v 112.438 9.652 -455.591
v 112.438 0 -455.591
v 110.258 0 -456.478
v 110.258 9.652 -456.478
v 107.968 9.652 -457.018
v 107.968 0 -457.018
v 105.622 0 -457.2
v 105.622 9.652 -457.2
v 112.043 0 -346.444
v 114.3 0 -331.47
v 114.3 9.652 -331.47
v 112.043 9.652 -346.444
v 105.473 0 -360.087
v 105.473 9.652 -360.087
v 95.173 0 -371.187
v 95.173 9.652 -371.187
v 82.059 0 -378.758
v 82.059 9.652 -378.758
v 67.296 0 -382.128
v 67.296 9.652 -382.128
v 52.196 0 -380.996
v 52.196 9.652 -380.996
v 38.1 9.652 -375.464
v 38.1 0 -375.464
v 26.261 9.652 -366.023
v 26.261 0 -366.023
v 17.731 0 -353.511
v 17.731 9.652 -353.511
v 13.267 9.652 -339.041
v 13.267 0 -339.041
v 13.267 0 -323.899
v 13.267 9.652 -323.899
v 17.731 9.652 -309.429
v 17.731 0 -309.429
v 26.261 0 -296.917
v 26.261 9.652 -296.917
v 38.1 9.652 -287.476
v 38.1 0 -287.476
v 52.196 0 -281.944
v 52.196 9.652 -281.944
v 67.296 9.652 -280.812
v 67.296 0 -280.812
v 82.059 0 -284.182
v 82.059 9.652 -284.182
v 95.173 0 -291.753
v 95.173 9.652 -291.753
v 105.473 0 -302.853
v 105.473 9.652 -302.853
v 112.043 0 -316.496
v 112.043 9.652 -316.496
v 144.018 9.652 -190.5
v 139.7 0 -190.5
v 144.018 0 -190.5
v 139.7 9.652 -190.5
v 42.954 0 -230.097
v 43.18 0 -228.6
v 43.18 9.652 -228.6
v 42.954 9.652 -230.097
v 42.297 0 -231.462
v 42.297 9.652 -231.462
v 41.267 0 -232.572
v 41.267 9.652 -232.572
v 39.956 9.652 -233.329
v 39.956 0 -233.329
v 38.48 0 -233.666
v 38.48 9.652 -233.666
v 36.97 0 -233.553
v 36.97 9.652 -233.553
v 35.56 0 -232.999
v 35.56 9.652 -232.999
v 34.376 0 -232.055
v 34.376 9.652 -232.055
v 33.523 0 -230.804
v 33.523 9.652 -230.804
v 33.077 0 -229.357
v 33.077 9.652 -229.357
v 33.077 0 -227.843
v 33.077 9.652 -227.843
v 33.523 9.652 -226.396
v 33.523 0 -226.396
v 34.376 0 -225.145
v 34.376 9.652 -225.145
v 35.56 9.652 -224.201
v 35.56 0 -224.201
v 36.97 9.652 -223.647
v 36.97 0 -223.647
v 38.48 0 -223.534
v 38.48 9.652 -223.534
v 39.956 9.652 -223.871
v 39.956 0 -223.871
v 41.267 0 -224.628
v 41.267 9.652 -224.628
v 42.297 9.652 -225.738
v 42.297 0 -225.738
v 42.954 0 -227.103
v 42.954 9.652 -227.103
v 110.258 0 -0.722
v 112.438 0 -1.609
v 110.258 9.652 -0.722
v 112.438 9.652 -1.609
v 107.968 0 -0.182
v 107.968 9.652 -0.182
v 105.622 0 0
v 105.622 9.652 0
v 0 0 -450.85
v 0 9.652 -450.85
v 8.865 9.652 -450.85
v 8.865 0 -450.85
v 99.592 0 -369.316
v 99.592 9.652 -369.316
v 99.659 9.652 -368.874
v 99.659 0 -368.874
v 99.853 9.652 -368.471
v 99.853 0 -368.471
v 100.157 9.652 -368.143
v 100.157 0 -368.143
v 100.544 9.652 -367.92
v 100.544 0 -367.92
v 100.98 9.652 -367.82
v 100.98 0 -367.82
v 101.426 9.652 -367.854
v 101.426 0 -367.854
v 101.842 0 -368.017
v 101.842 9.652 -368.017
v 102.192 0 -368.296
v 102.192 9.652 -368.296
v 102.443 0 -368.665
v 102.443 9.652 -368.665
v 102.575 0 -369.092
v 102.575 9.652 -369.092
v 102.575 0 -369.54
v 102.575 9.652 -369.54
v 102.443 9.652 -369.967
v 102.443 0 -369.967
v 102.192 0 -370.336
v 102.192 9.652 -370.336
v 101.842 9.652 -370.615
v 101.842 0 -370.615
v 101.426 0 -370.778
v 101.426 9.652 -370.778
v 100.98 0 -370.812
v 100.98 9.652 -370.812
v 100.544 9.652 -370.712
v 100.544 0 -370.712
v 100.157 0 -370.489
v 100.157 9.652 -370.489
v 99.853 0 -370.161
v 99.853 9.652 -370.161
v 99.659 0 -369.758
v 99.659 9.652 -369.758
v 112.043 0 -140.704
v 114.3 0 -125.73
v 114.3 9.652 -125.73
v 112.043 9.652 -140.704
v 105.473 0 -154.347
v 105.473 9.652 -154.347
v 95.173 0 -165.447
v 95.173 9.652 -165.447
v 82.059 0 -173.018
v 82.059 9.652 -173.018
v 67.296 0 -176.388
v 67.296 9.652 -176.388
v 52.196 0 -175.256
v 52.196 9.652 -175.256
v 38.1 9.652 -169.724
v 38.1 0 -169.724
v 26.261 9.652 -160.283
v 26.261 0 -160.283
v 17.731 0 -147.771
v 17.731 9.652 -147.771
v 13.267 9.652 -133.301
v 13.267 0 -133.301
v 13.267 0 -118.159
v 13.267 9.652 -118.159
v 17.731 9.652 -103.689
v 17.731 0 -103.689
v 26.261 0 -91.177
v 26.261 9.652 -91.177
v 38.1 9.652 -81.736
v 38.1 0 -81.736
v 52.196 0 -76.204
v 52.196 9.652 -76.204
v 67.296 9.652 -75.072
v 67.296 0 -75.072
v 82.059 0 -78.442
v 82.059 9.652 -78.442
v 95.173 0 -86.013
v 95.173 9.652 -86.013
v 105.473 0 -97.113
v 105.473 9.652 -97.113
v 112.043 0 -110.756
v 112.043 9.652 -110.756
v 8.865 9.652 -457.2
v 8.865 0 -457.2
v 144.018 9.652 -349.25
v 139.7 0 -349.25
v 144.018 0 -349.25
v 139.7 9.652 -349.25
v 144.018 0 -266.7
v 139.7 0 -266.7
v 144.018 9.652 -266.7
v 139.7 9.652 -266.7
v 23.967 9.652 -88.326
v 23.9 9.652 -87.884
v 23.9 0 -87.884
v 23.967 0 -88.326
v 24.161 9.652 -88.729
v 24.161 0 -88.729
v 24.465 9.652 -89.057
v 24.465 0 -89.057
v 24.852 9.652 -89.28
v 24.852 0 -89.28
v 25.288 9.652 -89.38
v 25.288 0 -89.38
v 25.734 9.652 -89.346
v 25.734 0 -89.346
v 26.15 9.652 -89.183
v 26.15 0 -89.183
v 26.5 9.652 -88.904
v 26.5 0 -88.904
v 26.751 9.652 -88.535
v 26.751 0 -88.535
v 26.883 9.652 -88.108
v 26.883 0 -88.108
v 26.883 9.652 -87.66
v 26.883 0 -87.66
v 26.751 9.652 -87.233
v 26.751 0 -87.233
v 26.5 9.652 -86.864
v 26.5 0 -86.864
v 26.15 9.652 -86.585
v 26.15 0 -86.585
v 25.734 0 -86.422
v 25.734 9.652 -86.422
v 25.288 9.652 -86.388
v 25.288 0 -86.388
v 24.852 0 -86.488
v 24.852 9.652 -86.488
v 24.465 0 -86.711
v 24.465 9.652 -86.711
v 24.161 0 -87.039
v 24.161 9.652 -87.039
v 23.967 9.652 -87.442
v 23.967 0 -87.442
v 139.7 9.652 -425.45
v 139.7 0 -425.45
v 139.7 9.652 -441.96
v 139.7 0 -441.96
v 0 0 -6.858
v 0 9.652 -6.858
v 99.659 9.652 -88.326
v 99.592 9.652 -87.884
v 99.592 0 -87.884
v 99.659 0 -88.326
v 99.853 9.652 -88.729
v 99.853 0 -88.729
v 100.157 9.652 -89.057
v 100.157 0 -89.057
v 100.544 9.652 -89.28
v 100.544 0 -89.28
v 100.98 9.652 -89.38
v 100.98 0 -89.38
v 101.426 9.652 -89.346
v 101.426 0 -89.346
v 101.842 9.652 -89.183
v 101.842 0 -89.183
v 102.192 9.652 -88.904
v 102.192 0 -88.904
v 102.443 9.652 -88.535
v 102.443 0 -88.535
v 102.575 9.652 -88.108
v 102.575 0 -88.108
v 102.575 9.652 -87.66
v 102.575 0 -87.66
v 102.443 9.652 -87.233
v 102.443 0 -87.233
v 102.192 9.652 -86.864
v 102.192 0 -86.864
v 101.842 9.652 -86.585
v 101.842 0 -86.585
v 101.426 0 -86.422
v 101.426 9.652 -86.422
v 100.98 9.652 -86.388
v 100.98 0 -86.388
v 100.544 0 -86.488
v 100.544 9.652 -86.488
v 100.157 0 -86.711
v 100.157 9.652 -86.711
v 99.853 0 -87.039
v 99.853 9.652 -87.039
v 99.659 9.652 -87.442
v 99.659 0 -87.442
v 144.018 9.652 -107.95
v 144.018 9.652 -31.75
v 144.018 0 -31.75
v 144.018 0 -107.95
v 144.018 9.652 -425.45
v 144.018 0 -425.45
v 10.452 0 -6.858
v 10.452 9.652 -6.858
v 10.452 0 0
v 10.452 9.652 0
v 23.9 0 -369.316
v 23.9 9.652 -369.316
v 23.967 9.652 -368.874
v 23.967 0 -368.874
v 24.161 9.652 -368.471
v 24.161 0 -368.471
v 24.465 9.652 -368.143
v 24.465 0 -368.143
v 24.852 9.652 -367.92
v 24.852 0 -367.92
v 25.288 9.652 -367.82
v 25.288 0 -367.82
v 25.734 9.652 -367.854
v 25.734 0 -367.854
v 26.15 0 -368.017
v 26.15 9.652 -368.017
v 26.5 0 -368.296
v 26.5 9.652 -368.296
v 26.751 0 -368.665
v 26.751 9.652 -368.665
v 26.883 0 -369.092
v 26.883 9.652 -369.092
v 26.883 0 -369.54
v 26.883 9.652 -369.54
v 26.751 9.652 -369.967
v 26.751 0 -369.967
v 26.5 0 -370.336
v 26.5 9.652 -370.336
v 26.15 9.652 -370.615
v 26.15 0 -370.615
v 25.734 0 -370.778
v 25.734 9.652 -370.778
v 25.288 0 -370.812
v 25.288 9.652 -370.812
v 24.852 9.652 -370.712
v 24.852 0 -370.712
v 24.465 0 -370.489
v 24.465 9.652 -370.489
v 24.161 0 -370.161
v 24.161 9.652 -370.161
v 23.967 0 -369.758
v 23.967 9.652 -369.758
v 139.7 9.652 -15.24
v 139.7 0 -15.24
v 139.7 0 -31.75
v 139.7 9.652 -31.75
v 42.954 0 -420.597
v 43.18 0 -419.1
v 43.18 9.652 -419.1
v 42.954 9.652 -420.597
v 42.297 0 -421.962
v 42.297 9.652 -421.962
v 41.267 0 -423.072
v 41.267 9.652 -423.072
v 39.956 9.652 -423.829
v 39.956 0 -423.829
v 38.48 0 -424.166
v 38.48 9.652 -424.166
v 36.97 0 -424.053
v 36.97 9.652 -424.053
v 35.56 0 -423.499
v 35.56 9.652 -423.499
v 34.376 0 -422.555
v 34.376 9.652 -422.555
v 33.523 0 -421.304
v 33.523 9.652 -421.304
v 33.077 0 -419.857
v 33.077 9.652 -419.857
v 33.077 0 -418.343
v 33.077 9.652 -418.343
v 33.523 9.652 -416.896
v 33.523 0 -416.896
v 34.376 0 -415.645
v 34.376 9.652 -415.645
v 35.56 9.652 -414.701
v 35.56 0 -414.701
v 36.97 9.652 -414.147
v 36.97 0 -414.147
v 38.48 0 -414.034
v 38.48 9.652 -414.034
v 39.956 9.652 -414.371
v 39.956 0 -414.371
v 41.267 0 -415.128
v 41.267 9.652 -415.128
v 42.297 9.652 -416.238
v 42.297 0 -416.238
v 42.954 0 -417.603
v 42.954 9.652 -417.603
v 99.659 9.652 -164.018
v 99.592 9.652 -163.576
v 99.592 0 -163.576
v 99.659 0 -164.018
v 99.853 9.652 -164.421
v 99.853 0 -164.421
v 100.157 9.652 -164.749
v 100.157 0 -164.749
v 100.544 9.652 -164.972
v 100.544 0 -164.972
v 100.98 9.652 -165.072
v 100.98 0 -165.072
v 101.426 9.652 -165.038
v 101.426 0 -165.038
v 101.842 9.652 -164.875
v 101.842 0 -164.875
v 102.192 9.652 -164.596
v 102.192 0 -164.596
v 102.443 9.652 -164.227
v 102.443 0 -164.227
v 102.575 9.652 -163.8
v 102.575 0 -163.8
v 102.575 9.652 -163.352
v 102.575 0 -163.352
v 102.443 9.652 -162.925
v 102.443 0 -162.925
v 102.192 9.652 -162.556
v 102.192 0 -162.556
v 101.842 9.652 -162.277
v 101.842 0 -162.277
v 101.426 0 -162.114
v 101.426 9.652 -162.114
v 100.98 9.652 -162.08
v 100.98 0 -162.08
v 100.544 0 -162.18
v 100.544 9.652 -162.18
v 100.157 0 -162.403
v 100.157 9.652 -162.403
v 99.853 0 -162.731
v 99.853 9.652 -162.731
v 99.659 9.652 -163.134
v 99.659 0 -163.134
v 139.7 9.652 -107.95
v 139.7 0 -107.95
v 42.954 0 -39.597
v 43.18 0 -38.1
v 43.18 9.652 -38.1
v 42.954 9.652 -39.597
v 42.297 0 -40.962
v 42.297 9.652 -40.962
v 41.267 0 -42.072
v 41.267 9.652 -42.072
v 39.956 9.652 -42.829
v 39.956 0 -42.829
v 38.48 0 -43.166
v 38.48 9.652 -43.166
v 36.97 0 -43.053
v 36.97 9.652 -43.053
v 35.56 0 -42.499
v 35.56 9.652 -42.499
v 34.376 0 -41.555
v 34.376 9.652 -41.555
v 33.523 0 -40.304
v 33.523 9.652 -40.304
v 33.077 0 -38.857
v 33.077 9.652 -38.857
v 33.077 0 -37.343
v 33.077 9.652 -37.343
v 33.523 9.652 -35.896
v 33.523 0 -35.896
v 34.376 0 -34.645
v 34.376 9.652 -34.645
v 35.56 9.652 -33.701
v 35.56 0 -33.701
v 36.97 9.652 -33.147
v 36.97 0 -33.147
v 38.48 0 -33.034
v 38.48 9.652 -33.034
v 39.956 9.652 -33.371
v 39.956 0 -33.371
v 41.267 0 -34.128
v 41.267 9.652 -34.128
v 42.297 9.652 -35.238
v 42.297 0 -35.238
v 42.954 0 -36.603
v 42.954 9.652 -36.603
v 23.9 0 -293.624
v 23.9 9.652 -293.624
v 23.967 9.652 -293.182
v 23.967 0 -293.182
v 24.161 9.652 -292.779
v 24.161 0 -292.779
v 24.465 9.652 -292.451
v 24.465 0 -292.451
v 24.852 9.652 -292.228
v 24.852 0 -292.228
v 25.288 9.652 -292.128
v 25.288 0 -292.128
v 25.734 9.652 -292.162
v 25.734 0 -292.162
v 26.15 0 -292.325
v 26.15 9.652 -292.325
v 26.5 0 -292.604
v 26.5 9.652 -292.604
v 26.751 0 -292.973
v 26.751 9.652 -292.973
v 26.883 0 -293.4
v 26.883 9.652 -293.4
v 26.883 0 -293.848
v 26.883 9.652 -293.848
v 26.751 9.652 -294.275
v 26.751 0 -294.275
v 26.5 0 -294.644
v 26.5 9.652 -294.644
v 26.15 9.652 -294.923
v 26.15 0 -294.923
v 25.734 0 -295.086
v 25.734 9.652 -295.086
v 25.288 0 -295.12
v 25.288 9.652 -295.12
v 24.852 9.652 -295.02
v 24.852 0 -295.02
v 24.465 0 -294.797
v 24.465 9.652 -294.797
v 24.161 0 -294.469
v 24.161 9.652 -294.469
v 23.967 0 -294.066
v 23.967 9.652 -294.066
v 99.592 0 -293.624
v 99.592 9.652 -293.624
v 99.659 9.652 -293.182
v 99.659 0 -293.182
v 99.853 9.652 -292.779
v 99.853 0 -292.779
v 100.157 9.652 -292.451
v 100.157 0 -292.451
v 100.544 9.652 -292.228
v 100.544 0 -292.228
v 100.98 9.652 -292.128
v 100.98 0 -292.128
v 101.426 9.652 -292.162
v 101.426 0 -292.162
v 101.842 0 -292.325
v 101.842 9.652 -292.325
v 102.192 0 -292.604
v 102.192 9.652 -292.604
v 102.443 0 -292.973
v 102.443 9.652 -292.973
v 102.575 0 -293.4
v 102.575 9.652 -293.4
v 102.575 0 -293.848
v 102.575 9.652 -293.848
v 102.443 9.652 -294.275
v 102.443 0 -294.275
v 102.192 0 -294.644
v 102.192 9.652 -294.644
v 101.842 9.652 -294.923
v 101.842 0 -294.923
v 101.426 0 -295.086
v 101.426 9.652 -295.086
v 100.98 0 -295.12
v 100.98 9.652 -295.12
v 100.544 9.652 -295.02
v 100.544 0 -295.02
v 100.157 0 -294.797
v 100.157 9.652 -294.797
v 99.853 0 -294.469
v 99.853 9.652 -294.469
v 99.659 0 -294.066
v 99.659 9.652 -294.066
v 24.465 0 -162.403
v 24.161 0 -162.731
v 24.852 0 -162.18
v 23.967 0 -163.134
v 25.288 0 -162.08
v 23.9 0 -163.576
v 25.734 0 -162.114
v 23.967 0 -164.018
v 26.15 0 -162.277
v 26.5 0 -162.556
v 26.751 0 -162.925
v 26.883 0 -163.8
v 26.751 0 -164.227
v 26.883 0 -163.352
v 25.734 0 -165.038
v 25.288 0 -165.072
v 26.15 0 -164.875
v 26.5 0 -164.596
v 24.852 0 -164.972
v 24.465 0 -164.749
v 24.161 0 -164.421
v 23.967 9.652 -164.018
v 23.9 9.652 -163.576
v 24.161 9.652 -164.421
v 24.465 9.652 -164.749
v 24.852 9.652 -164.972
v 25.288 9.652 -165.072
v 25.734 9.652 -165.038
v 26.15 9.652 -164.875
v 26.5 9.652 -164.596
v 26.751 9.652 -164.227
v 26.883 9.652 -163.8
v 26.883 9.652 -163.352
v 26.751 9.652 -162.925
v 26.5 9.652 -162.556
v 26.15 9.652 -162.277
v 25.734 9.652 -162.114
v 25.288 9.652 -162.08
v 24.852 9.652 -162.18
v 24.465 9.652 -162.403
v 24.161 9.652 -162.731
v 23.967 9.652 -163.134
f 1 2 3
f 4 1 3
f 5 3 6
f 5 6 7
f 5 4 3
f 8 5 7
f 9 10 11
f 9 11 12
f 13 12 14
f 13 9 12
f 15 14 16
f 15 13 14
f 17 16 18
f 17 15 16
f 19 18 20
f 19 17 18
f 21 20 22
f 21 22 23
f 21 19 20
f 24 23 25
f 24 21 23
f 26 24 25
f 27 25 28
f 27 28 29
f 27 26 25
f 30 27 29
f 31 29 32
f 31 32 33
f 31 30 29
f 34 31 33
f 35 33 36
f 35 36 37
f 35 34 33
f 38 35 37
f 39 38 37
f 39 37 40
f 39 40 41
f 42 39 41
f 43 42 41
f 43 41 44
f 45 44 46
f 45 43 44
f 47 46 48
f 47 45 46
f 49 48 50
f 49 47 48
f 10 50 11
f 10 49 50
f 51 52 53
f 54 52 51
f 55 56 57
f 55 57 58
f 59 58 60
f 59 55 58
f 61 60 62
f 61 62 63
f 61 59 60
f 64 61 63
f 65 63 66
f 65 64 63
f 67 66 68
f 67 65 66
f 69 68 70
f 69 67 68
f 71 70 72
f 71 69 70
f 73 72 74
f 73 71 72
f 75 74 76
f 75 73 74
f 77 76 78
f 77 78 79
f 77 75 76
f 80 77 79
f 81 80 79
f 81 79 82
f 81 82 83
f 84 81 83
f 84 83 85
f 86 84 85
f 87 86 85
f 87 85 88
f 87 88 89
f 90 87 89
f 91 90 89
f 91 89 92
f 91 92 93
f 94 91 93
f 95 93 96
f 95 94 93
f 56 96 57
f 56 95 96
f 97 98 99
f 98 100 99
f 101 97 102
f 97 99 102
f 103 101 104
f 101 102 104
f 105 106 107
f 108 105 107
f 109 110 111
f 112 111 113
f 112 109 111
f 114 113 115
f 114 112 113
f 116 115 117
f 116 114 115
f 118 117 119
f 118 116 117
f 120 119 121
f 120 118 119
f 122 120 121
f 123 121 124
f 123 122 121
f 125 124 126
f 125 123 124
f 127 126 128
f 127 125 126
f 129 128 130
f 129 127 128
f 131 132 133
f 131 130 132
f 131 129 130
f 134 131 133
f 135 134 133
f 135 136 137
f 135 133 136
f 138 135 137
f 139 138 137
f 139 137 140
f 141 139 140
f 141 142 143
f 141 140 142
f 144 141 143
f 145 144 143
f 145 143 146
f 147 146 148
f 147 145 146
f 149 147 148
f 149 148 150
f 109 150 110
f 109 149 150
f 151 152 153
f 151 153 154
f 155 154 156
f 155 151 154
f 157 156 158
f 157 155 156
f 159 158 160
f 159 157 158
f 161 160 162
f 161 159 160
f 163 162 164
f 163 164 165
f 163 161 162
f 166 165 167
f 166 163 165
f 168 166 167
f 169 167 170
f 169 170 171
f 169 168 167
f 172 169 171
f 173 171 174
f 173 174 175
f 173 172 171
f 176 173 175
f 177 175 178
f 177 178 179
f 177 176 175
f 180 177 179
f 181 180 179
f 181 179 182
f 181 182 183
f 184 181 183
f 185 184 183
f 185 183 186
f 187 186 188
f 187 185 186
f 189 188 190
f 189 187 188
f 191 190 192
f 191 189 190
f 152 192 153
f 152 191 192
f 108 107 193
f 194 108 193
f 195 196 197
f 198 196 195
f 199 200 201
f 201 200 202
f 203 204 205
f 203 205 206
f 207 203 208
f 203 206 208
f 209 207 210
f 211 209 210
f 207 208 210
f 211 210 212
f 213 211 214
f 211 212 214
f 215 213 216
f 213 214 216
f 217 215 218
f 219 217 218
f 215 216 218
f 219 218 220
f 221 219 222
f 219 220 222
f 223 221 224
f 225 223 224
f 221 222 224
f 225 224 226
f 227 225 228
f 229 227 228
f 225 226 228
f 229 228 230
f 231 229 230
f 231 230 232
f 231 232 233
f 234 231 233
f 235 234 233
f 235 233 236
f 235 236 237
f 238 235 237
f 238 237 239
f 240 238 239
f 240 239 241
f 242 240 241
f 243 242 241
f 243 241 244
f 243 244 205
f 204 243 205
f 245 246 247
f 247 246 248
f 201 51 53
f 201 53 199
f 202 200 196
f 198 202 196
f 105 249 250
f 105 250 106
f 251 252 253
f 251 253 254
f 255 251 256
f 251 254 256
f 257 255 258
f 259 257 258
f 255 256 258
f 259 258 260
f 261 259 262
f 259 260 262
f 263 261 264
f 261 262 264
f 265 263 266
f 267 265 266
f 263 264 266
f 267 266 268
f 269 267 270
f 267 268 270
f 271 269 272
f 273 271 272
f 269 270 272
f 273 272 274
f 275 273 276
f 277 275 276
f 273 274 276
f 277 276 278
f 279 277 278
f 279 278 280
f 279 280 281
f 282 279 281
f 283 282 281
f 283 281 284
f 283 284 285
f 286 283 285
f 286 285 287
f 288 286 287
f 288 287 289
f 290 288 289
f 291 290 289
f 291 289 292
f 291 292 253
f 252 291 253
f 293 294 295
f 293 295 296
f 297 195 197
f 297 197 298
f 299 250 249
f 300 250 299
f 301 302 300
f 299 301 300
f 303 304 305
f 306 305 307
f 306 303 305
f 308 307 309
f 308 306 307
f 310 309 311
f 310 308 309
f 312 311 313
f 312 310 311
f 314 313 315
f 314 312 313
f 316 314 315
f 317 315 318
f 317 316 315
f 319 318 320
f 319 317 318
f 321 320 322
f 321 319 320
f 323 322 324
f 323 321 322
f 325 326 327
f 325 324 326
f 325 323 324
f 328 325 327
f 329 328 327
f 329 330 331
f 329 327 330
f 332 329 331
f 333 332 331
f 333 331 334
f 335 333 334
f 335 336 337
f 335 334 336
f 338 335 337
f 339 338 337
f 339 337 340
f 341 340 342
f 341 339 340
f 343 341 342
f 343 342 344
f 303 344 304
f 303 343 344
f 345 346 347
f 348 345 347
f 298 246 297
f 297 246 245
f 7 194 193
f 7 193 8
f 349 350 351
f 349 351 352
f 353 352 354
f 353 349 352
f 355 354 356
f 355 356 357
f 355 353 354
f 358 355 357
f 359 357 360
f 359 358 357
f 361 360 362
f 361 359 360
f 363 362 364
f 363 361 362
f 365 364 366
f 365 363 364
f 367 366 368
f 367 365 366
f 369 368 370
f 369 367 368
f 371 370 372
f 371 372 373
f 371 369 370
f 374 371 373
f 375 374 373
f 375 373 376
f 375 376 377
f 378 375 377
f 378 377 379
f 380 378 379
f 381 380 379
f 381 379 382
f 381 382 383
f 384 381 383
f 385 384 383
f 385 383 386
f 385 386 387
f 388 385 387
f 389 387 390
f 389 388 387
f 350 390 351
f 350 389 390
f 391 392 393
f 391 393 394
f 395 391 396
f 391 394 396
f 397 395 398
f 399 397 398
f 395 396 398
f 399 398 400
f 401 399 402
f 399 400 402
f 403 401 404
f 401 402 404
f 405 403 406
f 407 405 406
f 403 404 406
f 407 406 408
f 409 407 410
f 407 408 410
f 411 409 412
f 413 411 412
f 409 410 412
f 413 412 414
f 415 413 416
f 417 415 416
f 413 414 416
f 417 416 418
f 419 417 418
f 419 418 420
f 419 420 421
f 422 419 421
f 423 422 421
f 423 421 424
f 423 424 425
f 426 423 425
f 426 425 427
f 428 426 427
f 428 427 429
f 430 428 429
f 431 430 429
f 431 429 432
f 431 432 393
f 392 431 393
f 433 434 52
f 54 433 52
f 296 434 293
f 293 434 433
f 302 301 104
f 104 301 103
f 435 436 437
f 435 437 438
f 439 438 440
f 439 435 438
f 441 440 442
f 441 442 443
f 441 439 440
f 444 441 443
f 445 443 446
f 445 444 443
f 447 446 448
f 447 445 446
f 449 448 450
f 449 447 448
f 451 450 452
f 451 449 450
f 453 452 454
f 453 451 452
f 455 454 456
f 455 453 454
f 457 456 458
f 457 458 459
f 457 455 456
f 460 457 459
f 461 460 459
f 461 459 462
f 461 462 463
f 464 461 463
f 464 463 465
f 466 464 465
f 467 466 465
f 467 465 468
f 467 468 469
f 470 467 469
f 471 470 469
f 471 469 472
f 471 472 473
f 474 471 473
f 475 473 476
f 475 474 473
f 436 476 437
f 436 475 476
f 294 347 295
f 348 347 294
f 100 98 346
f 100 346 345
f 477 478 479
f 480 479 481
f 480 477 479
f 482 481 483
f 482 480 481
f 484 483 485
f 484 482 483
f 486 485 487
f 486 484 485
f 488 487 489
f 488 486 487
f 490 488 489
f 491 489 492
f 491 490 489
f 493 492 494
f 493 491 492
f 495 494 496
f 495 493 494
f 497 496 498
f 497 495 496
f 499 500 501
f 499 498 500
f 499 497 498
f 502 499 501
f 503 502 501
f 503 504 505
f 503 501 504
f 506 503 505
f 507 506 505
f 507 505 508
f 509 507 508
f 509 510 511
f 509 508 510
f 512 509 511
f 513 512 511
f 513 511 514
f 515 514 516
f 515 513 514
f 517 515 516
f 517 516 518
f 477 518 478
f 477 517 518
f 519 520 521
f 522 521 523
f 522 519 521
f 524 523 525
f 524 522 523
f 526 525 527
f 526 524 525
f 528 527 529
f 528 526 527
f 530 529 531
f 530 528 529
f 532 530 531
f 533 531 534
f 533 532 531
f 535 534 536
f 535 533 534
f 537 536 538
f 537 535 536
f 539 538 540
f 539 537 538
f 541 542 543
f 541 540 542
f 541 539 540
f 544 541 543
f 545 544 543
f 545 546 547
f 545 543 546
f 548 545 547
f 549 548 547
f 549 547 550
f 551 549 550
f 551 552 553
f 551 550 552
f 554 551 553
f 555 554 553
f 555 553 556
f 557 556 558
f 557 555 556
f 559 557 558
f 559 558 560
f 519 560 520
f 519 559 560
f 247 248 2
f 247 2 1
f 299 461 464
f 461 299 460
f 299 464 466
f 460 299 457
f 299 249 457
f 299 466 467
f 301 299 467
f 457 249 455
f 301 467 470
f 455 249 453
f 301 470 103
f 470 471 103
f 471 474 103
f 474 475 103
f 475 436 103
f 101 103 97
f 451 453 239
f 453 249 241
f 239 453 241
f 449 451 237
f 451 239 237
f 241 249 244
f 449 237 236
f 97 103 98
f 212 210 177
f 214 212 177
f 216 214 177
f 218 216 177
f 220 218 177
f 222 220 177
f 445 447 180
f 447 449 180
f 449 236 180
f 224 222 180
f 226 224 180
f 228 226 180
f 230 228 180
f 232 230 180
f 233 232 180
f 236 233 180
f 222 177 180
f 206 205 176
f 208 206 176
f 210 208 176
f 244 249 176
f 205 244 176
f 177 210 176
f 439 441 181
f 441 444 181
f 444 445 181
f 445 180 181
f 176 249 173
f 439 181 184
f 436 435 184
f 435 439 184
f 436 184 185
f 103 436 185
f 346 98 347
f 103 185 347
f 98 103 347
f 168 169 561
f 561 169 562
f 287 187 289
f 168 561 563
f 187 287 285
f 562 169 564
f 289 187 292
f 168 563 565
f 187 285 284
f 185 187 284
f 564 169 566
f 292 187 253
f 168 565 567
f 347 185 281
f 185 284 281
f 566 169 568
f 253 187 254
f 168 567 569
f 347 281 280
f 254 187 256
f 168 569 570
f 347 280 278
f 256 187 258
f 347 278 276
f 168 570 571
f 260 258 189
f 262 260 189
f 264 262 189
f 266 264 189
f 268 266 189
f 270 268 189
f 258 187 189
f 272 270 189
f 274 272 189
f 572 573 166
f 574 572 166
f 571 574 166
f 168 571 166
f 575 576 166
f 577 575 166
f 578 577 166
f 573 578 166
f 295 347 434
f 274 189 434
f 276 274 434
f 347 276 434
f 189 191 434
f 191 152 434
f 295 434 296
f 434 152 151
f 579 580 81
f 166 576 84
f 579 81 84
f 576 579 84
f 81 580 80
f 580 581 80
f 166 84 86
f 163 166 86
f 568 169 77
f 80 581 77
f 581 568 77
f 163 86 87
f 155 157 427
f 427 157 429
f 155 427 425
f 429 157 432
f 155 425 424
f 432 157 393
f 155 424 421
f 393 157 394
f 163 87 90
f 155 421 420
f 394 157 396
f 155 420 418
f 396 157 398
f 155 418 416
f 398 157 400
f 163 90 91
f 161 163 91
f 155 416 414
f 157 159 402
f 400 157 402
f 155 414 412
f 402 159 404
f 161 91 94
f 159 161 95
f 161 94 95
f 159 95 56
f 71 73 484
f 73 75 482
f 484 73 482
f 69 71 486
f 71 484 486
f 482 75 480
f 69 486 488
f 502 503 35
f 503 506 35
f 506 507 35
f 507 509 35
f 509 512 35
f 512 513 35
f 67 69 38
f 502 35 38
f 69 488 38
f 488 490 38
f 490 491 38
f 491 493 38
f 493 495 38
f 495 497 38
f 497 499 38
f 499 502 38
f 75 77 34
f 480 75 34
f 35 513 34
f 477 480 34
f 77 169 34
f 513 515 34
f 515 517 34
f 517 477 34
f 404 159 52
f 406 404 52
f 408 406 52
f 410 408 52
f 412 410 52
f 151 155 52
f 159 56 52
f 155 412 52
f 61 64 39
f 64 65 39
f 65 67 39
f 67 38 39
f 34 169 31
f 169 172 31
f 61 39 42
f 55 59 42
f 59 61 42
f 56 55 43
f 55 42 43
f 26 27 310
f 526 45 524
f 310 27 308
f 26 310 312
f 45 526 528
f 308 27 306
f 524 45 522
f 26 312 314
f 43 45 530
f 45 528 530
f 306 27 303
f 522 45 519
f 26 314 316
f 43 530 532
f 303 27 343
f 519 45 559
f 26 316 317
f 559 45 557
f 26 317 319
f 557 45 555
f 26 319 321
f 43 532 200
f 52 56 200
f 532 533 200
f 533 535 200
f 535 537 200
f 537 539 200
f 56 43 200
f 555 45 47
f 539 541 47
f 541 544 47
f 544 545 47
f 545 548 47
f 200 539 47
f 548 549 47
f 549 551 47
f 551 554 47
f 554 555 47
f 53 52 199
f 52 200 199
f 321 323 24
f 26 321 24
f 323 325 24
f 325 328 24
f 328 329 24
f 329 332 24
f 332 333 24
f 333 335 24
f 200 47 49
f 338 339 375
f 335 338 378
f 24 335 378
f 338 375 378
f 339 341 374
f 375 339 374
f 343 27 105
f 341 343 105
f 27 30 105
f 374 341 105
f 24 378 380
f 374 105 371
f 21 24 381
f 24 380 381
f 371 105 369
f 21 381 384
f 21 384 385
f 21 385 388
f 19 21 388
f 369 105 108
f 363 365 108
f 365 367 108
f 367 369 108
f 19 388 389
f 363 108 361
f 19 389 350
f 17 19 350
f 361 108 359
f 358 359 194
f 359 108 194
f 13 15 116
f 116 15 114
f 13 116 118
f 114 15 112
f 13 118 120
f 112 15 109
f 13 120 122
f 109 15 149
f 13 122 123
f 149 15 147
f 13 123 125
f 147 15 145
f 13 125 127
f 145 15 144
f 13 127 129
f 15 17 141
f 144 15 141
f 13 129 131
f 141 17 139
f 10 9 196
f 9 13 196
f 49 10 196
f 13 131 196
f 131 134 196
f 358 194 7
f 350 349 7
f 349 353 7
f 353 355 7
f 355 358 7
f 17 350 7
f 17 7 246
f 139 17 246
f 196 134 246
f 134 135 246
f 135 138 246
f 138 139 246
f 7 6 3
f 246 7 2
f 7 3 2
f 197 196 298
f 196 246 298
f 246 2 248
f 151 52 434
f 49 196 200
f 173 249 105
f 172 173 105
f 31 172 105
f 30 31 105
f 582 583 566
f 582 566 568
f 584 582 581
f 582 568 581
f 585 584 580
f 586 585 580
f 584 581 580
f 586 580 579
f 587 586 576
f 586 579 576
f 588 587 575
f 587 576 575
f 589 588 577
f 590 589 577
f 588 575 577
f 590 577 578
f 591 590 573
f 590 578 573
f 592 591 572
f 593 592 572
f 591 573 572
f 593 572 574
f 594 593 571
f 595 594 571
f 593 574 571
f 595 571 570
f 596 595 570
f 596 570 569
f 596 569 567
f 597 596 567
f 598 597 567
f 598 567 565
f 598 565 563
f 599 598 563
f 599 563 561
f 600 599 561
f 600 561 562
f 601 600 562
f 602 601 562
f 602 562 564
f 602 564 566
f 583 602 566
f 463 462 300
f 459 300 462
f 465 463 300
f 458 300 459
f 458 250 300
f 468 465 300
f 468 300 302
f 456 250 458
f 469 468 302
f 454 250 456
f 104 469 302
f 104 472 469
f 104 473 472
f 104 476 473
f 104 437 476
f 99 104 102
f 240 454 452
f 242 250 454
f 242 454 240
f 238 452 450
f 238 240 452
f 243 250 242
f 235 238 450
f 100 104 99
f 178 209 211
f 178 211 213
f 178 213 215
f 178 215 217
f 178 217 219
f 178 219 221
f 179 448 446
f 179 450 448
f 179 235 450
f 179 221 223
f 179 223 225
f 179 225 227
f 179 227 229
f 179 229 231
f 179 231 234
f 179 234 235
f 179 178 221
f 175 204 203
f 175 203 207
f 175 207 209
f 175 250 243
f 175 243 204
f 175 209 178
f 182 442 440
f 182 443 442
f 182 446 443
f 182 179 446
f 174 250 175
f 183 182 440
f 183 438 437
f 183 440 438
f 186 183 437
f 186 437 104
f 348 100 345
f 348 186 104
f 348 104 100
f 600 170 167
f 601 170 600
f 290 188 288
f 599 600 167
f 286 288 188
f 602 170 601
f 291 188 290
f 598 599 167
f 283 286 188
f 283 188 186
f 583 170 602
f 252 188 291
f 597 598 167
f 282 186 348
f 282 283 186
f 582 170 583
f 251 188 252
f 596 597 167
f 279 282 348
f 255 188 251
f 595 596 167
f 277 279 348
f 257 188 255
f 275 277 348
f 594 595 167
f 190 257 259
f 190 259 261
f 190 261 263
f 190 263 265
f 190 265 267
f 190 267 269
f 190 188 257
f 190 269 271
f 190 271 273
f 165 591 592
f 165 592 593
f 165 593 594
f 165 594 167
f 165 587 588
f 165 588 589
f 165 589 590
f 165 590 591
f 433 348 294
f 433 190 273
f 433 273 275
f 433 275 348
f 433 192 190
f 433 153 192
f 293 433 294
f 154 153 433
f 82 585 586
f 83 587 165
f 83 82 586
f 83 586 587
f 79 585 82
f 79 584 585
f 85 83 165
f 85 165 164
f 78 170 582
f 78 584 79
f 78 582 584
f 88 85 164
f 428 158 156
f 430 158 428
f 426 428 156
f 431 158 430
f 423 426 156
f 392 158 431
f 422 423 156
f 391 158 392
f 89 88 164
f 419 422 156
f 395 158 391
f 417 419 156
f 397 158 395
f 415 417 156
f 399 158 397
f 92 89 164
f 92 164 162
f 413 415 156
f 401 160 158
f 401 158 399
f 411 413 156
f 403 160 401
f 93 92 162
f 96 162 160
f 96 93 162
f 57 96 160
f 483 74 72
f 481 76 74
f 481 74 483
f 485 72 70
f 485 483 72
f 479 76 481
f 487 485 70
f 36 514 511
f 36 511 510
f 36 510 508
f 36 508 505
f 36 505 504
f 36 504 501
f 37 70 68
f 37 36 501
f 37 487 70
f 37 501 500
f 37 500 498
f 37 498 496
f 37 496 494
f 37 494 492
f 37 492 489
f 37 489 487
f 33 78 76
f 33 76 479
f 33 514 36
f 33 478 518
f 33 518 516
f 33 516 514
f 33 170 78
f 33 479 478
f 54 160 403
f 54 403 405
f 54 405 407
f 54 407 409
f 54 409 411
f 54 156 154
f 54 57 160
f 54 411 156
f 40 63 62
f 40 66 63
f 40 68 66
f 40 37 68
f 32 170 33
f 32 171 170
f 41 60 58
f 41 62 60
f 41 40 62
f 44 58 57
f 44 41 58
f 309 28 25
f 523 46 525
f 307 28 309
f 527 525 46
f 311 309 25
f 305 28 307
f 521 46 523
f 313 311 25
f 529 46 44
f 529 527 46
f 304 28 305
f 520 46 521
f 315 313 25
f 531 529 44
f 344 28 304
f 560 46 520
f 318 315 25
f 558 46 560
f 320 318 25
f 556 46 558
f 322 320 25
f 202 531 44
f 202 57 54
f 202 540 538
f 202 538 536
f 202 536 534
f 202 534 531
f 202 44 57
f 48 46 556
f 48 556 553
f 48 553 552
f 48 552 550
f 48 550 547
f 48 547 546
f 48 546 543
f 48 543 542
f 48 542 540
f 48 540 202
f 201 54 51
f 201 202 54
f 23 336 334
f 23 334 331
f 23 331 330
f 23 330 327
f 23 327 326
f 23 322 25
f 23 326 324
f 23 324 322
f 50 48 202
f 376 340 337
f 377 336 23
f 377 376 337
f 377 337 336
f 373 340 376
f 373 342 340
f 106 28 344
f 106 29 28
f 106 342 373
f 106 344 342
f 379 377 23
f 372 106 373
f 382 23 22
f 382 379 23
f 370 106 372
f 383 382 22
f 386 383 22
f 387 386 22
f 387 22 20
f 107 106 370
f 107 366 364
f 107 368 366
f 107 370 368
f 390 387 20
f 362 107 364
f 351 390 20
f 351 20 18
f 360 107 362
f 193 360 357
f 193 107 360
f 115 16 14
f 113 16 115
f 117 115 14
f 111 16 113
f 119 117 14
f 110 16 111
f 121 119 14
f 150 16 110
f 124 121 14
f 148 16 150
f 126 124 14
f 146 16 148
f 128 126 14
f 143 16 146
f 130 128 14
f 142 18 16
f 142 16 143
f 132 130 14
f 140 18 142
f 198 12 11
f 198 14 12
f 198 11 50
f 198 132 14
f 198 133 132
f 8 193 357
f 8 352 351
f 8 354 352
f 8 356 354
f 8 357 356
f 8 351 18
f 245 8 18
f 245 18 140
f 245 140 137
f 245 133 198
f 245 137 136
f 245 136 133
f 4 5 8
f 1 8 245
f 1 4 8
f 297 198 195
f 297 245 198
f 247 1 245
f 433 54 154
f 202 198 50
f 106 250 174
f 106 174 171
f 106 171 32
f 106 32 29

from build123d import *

# Parameters (mm, degrees)
SKETCH1_W                    = 139.7
SKETCH1_H                    = 457.2
SKETCH1_R                    = 50.8
SKETCH1_R_2                  = 5.08
BOSS_EXTRUDE1_DEPTH          = 9.652
SKETCH4_W                    = 10.452383168
SKETCH4_H                    = 6.858
SKETCH4_W_2                  = 8.864883168
SKETCH4_H_2                  = 6.35
CUT_EXTRUDE1_DEPTH           = 10.652
CHAMFER1_SIZE                = 15.24
CHAMFER1_SIZE2               = 30.48
CHAMFER2_SIZE                = 30.48
CHAMFER2_SIZE2               = 15.24
FILLET2_R                    = 15.24
SKETCH5_W                    = 76.2
SKETCH5_H                    = 9.652
BOSS_EXTRUDE2_DEPTH          = 4.318
F_3_0_3_DIAMETER_HOLE1_D     = 3
F_3_0_3_DIAMETER_HOLE1_DEPTH = 9.652


with BuildPart() as part:
    # Sketch1 → Boss-Extrude1 (new body)
    with BuildSketch(Plane(origin=(0, 0, 0), x_dir=(1, 0, 0), z_dir=(0, 1, 0))):
        with Locations((69.85, 228.6)):
            Rectangle(SKETCH1_W, SKETCH1_H)
        with Locations((63.5, 125.73)):
            Circle(SKETCH1_R, mode=Mode.SUBTRACT)
        with Locations((38.1, 38.1)):
            Circle(SKETCH1_R_2, mode=Mode.SUBTRACT)
        with Locations((38.1, 419.1)):
            Circle(SKETCH1_R_2, mode=Mode.SUBTRACT)
        with Locations((63.5, 331.47)):
            Circle(SKETCH1_R, mode=Mode.SUBTRACT)
        with Locations((38.1, 228.6)):
            Circle(SKETCH1_R_2, mode=Mode.SUBTRACT)
    extrude(amount=BOSS_EXTRUDE1_DEPTH)

    # Sketch4 → Cut-Extrude1 (cut, through all)
    with BuildSketch(Plane(origin=(0, 9.652, 0), x_dir=(1, 0, 0), z_dir=(0, 1, 0))):
        with Locations((5.226191584, 3.429)):
            Rectangle(SKETCH4_W, SKETCH4_H)
        with Locations((4.432441584, 454.025)):
            Rectangle(SKETCH4_W_2, SKETCH4_H_2)
    extrude(amount=-CUT_EXTRUDE1_DEPTH, mode=Mode.SUBTRACT)

    # Chamfer1
    chamfer1_edges = [part.edges().sort_by_distance(p)[0] for p in [
        (139.7, 4.826, -457.2),
    ]]
    chamfer1_side = [part.faces().sort_by_distance(p)[0] for p in [
        (139.7, 4.826, -228.6),
    ]]
    chamfer(chamfer1_edges, length=CHAMFER1_SIZE, length2=CHAMFER1_SIZE2, reference=chamfer1_side[0])

    # Chamfer2
    chamfer2_edges = [part.edges().sort_by_distance(p)[0] for p in [
        (139.7, 4.826, 0),
    ]]
    chamfer2_side = [part.faces().sort_by_distance(p)[0] for p in [
        (75.076191584, 4.826, 0),
    ]]
    chamfer(chamfer2_edges, length=CHAMFER2_SIZE, length2=CHAMFER2_SIZE2, reference=chamfer2_side[0])

    # Fillet2
    fillet2_edges = [part.edges().sort_by_distance(p)[0] for p in [
        (109.22, 4.826, -457.2),
        (109.22, 4.826, 0),
    ]]
    fillet(fillet2_edges, radius=FILLET2_R)

    # Sketch5 → Boss-Extrude2 (add)
    with BuildSketch(Plane(origin=(139.7, 0, 0), x_dir=(0, 0, -1), z_dir=(1, 0, 0))):
        with Locations((69.85, 4.826)):
            Rectangle(SKETCH5_W, SKETCH5_H)
        with Locations((228.6, 4.826)):
            Rectangle(SKETCH5_W, SKETCH5_H)
        with Locations((387.35, 4.826)):
            Rectangle(SKETCH5_W, SKETCH5_H)
    extrude(amount=BOSS_EXTRUDE2_DEPTH)

    # Ø3.0 (3) Diameter Hole1
    with Locations(Plane(origin=(0, 9.652, 0), x_dir=(1, 0, 0), z_dir=(0, 1, 0))):
        with Locations((101.092, 87.884), (25.4, 87.884), (25.4, 163.576), (101.092, 163.576)):
            f_3_0_3_diameter_hole1 = Hole(F_3_0_3_DIAMETER_HOLE1_D / 2, depth=F_3_0_3_DIAMETER_HOLE1_DEPTH)

    # Mirror1: Ø3.0 (3) Diameter Hole1 across plane
    add(f_3_0_3_diameter_hole1.mirror(Plane.XY.offset(-228.6)), mode=Mode.SUBTRACT)


solid = part.part
